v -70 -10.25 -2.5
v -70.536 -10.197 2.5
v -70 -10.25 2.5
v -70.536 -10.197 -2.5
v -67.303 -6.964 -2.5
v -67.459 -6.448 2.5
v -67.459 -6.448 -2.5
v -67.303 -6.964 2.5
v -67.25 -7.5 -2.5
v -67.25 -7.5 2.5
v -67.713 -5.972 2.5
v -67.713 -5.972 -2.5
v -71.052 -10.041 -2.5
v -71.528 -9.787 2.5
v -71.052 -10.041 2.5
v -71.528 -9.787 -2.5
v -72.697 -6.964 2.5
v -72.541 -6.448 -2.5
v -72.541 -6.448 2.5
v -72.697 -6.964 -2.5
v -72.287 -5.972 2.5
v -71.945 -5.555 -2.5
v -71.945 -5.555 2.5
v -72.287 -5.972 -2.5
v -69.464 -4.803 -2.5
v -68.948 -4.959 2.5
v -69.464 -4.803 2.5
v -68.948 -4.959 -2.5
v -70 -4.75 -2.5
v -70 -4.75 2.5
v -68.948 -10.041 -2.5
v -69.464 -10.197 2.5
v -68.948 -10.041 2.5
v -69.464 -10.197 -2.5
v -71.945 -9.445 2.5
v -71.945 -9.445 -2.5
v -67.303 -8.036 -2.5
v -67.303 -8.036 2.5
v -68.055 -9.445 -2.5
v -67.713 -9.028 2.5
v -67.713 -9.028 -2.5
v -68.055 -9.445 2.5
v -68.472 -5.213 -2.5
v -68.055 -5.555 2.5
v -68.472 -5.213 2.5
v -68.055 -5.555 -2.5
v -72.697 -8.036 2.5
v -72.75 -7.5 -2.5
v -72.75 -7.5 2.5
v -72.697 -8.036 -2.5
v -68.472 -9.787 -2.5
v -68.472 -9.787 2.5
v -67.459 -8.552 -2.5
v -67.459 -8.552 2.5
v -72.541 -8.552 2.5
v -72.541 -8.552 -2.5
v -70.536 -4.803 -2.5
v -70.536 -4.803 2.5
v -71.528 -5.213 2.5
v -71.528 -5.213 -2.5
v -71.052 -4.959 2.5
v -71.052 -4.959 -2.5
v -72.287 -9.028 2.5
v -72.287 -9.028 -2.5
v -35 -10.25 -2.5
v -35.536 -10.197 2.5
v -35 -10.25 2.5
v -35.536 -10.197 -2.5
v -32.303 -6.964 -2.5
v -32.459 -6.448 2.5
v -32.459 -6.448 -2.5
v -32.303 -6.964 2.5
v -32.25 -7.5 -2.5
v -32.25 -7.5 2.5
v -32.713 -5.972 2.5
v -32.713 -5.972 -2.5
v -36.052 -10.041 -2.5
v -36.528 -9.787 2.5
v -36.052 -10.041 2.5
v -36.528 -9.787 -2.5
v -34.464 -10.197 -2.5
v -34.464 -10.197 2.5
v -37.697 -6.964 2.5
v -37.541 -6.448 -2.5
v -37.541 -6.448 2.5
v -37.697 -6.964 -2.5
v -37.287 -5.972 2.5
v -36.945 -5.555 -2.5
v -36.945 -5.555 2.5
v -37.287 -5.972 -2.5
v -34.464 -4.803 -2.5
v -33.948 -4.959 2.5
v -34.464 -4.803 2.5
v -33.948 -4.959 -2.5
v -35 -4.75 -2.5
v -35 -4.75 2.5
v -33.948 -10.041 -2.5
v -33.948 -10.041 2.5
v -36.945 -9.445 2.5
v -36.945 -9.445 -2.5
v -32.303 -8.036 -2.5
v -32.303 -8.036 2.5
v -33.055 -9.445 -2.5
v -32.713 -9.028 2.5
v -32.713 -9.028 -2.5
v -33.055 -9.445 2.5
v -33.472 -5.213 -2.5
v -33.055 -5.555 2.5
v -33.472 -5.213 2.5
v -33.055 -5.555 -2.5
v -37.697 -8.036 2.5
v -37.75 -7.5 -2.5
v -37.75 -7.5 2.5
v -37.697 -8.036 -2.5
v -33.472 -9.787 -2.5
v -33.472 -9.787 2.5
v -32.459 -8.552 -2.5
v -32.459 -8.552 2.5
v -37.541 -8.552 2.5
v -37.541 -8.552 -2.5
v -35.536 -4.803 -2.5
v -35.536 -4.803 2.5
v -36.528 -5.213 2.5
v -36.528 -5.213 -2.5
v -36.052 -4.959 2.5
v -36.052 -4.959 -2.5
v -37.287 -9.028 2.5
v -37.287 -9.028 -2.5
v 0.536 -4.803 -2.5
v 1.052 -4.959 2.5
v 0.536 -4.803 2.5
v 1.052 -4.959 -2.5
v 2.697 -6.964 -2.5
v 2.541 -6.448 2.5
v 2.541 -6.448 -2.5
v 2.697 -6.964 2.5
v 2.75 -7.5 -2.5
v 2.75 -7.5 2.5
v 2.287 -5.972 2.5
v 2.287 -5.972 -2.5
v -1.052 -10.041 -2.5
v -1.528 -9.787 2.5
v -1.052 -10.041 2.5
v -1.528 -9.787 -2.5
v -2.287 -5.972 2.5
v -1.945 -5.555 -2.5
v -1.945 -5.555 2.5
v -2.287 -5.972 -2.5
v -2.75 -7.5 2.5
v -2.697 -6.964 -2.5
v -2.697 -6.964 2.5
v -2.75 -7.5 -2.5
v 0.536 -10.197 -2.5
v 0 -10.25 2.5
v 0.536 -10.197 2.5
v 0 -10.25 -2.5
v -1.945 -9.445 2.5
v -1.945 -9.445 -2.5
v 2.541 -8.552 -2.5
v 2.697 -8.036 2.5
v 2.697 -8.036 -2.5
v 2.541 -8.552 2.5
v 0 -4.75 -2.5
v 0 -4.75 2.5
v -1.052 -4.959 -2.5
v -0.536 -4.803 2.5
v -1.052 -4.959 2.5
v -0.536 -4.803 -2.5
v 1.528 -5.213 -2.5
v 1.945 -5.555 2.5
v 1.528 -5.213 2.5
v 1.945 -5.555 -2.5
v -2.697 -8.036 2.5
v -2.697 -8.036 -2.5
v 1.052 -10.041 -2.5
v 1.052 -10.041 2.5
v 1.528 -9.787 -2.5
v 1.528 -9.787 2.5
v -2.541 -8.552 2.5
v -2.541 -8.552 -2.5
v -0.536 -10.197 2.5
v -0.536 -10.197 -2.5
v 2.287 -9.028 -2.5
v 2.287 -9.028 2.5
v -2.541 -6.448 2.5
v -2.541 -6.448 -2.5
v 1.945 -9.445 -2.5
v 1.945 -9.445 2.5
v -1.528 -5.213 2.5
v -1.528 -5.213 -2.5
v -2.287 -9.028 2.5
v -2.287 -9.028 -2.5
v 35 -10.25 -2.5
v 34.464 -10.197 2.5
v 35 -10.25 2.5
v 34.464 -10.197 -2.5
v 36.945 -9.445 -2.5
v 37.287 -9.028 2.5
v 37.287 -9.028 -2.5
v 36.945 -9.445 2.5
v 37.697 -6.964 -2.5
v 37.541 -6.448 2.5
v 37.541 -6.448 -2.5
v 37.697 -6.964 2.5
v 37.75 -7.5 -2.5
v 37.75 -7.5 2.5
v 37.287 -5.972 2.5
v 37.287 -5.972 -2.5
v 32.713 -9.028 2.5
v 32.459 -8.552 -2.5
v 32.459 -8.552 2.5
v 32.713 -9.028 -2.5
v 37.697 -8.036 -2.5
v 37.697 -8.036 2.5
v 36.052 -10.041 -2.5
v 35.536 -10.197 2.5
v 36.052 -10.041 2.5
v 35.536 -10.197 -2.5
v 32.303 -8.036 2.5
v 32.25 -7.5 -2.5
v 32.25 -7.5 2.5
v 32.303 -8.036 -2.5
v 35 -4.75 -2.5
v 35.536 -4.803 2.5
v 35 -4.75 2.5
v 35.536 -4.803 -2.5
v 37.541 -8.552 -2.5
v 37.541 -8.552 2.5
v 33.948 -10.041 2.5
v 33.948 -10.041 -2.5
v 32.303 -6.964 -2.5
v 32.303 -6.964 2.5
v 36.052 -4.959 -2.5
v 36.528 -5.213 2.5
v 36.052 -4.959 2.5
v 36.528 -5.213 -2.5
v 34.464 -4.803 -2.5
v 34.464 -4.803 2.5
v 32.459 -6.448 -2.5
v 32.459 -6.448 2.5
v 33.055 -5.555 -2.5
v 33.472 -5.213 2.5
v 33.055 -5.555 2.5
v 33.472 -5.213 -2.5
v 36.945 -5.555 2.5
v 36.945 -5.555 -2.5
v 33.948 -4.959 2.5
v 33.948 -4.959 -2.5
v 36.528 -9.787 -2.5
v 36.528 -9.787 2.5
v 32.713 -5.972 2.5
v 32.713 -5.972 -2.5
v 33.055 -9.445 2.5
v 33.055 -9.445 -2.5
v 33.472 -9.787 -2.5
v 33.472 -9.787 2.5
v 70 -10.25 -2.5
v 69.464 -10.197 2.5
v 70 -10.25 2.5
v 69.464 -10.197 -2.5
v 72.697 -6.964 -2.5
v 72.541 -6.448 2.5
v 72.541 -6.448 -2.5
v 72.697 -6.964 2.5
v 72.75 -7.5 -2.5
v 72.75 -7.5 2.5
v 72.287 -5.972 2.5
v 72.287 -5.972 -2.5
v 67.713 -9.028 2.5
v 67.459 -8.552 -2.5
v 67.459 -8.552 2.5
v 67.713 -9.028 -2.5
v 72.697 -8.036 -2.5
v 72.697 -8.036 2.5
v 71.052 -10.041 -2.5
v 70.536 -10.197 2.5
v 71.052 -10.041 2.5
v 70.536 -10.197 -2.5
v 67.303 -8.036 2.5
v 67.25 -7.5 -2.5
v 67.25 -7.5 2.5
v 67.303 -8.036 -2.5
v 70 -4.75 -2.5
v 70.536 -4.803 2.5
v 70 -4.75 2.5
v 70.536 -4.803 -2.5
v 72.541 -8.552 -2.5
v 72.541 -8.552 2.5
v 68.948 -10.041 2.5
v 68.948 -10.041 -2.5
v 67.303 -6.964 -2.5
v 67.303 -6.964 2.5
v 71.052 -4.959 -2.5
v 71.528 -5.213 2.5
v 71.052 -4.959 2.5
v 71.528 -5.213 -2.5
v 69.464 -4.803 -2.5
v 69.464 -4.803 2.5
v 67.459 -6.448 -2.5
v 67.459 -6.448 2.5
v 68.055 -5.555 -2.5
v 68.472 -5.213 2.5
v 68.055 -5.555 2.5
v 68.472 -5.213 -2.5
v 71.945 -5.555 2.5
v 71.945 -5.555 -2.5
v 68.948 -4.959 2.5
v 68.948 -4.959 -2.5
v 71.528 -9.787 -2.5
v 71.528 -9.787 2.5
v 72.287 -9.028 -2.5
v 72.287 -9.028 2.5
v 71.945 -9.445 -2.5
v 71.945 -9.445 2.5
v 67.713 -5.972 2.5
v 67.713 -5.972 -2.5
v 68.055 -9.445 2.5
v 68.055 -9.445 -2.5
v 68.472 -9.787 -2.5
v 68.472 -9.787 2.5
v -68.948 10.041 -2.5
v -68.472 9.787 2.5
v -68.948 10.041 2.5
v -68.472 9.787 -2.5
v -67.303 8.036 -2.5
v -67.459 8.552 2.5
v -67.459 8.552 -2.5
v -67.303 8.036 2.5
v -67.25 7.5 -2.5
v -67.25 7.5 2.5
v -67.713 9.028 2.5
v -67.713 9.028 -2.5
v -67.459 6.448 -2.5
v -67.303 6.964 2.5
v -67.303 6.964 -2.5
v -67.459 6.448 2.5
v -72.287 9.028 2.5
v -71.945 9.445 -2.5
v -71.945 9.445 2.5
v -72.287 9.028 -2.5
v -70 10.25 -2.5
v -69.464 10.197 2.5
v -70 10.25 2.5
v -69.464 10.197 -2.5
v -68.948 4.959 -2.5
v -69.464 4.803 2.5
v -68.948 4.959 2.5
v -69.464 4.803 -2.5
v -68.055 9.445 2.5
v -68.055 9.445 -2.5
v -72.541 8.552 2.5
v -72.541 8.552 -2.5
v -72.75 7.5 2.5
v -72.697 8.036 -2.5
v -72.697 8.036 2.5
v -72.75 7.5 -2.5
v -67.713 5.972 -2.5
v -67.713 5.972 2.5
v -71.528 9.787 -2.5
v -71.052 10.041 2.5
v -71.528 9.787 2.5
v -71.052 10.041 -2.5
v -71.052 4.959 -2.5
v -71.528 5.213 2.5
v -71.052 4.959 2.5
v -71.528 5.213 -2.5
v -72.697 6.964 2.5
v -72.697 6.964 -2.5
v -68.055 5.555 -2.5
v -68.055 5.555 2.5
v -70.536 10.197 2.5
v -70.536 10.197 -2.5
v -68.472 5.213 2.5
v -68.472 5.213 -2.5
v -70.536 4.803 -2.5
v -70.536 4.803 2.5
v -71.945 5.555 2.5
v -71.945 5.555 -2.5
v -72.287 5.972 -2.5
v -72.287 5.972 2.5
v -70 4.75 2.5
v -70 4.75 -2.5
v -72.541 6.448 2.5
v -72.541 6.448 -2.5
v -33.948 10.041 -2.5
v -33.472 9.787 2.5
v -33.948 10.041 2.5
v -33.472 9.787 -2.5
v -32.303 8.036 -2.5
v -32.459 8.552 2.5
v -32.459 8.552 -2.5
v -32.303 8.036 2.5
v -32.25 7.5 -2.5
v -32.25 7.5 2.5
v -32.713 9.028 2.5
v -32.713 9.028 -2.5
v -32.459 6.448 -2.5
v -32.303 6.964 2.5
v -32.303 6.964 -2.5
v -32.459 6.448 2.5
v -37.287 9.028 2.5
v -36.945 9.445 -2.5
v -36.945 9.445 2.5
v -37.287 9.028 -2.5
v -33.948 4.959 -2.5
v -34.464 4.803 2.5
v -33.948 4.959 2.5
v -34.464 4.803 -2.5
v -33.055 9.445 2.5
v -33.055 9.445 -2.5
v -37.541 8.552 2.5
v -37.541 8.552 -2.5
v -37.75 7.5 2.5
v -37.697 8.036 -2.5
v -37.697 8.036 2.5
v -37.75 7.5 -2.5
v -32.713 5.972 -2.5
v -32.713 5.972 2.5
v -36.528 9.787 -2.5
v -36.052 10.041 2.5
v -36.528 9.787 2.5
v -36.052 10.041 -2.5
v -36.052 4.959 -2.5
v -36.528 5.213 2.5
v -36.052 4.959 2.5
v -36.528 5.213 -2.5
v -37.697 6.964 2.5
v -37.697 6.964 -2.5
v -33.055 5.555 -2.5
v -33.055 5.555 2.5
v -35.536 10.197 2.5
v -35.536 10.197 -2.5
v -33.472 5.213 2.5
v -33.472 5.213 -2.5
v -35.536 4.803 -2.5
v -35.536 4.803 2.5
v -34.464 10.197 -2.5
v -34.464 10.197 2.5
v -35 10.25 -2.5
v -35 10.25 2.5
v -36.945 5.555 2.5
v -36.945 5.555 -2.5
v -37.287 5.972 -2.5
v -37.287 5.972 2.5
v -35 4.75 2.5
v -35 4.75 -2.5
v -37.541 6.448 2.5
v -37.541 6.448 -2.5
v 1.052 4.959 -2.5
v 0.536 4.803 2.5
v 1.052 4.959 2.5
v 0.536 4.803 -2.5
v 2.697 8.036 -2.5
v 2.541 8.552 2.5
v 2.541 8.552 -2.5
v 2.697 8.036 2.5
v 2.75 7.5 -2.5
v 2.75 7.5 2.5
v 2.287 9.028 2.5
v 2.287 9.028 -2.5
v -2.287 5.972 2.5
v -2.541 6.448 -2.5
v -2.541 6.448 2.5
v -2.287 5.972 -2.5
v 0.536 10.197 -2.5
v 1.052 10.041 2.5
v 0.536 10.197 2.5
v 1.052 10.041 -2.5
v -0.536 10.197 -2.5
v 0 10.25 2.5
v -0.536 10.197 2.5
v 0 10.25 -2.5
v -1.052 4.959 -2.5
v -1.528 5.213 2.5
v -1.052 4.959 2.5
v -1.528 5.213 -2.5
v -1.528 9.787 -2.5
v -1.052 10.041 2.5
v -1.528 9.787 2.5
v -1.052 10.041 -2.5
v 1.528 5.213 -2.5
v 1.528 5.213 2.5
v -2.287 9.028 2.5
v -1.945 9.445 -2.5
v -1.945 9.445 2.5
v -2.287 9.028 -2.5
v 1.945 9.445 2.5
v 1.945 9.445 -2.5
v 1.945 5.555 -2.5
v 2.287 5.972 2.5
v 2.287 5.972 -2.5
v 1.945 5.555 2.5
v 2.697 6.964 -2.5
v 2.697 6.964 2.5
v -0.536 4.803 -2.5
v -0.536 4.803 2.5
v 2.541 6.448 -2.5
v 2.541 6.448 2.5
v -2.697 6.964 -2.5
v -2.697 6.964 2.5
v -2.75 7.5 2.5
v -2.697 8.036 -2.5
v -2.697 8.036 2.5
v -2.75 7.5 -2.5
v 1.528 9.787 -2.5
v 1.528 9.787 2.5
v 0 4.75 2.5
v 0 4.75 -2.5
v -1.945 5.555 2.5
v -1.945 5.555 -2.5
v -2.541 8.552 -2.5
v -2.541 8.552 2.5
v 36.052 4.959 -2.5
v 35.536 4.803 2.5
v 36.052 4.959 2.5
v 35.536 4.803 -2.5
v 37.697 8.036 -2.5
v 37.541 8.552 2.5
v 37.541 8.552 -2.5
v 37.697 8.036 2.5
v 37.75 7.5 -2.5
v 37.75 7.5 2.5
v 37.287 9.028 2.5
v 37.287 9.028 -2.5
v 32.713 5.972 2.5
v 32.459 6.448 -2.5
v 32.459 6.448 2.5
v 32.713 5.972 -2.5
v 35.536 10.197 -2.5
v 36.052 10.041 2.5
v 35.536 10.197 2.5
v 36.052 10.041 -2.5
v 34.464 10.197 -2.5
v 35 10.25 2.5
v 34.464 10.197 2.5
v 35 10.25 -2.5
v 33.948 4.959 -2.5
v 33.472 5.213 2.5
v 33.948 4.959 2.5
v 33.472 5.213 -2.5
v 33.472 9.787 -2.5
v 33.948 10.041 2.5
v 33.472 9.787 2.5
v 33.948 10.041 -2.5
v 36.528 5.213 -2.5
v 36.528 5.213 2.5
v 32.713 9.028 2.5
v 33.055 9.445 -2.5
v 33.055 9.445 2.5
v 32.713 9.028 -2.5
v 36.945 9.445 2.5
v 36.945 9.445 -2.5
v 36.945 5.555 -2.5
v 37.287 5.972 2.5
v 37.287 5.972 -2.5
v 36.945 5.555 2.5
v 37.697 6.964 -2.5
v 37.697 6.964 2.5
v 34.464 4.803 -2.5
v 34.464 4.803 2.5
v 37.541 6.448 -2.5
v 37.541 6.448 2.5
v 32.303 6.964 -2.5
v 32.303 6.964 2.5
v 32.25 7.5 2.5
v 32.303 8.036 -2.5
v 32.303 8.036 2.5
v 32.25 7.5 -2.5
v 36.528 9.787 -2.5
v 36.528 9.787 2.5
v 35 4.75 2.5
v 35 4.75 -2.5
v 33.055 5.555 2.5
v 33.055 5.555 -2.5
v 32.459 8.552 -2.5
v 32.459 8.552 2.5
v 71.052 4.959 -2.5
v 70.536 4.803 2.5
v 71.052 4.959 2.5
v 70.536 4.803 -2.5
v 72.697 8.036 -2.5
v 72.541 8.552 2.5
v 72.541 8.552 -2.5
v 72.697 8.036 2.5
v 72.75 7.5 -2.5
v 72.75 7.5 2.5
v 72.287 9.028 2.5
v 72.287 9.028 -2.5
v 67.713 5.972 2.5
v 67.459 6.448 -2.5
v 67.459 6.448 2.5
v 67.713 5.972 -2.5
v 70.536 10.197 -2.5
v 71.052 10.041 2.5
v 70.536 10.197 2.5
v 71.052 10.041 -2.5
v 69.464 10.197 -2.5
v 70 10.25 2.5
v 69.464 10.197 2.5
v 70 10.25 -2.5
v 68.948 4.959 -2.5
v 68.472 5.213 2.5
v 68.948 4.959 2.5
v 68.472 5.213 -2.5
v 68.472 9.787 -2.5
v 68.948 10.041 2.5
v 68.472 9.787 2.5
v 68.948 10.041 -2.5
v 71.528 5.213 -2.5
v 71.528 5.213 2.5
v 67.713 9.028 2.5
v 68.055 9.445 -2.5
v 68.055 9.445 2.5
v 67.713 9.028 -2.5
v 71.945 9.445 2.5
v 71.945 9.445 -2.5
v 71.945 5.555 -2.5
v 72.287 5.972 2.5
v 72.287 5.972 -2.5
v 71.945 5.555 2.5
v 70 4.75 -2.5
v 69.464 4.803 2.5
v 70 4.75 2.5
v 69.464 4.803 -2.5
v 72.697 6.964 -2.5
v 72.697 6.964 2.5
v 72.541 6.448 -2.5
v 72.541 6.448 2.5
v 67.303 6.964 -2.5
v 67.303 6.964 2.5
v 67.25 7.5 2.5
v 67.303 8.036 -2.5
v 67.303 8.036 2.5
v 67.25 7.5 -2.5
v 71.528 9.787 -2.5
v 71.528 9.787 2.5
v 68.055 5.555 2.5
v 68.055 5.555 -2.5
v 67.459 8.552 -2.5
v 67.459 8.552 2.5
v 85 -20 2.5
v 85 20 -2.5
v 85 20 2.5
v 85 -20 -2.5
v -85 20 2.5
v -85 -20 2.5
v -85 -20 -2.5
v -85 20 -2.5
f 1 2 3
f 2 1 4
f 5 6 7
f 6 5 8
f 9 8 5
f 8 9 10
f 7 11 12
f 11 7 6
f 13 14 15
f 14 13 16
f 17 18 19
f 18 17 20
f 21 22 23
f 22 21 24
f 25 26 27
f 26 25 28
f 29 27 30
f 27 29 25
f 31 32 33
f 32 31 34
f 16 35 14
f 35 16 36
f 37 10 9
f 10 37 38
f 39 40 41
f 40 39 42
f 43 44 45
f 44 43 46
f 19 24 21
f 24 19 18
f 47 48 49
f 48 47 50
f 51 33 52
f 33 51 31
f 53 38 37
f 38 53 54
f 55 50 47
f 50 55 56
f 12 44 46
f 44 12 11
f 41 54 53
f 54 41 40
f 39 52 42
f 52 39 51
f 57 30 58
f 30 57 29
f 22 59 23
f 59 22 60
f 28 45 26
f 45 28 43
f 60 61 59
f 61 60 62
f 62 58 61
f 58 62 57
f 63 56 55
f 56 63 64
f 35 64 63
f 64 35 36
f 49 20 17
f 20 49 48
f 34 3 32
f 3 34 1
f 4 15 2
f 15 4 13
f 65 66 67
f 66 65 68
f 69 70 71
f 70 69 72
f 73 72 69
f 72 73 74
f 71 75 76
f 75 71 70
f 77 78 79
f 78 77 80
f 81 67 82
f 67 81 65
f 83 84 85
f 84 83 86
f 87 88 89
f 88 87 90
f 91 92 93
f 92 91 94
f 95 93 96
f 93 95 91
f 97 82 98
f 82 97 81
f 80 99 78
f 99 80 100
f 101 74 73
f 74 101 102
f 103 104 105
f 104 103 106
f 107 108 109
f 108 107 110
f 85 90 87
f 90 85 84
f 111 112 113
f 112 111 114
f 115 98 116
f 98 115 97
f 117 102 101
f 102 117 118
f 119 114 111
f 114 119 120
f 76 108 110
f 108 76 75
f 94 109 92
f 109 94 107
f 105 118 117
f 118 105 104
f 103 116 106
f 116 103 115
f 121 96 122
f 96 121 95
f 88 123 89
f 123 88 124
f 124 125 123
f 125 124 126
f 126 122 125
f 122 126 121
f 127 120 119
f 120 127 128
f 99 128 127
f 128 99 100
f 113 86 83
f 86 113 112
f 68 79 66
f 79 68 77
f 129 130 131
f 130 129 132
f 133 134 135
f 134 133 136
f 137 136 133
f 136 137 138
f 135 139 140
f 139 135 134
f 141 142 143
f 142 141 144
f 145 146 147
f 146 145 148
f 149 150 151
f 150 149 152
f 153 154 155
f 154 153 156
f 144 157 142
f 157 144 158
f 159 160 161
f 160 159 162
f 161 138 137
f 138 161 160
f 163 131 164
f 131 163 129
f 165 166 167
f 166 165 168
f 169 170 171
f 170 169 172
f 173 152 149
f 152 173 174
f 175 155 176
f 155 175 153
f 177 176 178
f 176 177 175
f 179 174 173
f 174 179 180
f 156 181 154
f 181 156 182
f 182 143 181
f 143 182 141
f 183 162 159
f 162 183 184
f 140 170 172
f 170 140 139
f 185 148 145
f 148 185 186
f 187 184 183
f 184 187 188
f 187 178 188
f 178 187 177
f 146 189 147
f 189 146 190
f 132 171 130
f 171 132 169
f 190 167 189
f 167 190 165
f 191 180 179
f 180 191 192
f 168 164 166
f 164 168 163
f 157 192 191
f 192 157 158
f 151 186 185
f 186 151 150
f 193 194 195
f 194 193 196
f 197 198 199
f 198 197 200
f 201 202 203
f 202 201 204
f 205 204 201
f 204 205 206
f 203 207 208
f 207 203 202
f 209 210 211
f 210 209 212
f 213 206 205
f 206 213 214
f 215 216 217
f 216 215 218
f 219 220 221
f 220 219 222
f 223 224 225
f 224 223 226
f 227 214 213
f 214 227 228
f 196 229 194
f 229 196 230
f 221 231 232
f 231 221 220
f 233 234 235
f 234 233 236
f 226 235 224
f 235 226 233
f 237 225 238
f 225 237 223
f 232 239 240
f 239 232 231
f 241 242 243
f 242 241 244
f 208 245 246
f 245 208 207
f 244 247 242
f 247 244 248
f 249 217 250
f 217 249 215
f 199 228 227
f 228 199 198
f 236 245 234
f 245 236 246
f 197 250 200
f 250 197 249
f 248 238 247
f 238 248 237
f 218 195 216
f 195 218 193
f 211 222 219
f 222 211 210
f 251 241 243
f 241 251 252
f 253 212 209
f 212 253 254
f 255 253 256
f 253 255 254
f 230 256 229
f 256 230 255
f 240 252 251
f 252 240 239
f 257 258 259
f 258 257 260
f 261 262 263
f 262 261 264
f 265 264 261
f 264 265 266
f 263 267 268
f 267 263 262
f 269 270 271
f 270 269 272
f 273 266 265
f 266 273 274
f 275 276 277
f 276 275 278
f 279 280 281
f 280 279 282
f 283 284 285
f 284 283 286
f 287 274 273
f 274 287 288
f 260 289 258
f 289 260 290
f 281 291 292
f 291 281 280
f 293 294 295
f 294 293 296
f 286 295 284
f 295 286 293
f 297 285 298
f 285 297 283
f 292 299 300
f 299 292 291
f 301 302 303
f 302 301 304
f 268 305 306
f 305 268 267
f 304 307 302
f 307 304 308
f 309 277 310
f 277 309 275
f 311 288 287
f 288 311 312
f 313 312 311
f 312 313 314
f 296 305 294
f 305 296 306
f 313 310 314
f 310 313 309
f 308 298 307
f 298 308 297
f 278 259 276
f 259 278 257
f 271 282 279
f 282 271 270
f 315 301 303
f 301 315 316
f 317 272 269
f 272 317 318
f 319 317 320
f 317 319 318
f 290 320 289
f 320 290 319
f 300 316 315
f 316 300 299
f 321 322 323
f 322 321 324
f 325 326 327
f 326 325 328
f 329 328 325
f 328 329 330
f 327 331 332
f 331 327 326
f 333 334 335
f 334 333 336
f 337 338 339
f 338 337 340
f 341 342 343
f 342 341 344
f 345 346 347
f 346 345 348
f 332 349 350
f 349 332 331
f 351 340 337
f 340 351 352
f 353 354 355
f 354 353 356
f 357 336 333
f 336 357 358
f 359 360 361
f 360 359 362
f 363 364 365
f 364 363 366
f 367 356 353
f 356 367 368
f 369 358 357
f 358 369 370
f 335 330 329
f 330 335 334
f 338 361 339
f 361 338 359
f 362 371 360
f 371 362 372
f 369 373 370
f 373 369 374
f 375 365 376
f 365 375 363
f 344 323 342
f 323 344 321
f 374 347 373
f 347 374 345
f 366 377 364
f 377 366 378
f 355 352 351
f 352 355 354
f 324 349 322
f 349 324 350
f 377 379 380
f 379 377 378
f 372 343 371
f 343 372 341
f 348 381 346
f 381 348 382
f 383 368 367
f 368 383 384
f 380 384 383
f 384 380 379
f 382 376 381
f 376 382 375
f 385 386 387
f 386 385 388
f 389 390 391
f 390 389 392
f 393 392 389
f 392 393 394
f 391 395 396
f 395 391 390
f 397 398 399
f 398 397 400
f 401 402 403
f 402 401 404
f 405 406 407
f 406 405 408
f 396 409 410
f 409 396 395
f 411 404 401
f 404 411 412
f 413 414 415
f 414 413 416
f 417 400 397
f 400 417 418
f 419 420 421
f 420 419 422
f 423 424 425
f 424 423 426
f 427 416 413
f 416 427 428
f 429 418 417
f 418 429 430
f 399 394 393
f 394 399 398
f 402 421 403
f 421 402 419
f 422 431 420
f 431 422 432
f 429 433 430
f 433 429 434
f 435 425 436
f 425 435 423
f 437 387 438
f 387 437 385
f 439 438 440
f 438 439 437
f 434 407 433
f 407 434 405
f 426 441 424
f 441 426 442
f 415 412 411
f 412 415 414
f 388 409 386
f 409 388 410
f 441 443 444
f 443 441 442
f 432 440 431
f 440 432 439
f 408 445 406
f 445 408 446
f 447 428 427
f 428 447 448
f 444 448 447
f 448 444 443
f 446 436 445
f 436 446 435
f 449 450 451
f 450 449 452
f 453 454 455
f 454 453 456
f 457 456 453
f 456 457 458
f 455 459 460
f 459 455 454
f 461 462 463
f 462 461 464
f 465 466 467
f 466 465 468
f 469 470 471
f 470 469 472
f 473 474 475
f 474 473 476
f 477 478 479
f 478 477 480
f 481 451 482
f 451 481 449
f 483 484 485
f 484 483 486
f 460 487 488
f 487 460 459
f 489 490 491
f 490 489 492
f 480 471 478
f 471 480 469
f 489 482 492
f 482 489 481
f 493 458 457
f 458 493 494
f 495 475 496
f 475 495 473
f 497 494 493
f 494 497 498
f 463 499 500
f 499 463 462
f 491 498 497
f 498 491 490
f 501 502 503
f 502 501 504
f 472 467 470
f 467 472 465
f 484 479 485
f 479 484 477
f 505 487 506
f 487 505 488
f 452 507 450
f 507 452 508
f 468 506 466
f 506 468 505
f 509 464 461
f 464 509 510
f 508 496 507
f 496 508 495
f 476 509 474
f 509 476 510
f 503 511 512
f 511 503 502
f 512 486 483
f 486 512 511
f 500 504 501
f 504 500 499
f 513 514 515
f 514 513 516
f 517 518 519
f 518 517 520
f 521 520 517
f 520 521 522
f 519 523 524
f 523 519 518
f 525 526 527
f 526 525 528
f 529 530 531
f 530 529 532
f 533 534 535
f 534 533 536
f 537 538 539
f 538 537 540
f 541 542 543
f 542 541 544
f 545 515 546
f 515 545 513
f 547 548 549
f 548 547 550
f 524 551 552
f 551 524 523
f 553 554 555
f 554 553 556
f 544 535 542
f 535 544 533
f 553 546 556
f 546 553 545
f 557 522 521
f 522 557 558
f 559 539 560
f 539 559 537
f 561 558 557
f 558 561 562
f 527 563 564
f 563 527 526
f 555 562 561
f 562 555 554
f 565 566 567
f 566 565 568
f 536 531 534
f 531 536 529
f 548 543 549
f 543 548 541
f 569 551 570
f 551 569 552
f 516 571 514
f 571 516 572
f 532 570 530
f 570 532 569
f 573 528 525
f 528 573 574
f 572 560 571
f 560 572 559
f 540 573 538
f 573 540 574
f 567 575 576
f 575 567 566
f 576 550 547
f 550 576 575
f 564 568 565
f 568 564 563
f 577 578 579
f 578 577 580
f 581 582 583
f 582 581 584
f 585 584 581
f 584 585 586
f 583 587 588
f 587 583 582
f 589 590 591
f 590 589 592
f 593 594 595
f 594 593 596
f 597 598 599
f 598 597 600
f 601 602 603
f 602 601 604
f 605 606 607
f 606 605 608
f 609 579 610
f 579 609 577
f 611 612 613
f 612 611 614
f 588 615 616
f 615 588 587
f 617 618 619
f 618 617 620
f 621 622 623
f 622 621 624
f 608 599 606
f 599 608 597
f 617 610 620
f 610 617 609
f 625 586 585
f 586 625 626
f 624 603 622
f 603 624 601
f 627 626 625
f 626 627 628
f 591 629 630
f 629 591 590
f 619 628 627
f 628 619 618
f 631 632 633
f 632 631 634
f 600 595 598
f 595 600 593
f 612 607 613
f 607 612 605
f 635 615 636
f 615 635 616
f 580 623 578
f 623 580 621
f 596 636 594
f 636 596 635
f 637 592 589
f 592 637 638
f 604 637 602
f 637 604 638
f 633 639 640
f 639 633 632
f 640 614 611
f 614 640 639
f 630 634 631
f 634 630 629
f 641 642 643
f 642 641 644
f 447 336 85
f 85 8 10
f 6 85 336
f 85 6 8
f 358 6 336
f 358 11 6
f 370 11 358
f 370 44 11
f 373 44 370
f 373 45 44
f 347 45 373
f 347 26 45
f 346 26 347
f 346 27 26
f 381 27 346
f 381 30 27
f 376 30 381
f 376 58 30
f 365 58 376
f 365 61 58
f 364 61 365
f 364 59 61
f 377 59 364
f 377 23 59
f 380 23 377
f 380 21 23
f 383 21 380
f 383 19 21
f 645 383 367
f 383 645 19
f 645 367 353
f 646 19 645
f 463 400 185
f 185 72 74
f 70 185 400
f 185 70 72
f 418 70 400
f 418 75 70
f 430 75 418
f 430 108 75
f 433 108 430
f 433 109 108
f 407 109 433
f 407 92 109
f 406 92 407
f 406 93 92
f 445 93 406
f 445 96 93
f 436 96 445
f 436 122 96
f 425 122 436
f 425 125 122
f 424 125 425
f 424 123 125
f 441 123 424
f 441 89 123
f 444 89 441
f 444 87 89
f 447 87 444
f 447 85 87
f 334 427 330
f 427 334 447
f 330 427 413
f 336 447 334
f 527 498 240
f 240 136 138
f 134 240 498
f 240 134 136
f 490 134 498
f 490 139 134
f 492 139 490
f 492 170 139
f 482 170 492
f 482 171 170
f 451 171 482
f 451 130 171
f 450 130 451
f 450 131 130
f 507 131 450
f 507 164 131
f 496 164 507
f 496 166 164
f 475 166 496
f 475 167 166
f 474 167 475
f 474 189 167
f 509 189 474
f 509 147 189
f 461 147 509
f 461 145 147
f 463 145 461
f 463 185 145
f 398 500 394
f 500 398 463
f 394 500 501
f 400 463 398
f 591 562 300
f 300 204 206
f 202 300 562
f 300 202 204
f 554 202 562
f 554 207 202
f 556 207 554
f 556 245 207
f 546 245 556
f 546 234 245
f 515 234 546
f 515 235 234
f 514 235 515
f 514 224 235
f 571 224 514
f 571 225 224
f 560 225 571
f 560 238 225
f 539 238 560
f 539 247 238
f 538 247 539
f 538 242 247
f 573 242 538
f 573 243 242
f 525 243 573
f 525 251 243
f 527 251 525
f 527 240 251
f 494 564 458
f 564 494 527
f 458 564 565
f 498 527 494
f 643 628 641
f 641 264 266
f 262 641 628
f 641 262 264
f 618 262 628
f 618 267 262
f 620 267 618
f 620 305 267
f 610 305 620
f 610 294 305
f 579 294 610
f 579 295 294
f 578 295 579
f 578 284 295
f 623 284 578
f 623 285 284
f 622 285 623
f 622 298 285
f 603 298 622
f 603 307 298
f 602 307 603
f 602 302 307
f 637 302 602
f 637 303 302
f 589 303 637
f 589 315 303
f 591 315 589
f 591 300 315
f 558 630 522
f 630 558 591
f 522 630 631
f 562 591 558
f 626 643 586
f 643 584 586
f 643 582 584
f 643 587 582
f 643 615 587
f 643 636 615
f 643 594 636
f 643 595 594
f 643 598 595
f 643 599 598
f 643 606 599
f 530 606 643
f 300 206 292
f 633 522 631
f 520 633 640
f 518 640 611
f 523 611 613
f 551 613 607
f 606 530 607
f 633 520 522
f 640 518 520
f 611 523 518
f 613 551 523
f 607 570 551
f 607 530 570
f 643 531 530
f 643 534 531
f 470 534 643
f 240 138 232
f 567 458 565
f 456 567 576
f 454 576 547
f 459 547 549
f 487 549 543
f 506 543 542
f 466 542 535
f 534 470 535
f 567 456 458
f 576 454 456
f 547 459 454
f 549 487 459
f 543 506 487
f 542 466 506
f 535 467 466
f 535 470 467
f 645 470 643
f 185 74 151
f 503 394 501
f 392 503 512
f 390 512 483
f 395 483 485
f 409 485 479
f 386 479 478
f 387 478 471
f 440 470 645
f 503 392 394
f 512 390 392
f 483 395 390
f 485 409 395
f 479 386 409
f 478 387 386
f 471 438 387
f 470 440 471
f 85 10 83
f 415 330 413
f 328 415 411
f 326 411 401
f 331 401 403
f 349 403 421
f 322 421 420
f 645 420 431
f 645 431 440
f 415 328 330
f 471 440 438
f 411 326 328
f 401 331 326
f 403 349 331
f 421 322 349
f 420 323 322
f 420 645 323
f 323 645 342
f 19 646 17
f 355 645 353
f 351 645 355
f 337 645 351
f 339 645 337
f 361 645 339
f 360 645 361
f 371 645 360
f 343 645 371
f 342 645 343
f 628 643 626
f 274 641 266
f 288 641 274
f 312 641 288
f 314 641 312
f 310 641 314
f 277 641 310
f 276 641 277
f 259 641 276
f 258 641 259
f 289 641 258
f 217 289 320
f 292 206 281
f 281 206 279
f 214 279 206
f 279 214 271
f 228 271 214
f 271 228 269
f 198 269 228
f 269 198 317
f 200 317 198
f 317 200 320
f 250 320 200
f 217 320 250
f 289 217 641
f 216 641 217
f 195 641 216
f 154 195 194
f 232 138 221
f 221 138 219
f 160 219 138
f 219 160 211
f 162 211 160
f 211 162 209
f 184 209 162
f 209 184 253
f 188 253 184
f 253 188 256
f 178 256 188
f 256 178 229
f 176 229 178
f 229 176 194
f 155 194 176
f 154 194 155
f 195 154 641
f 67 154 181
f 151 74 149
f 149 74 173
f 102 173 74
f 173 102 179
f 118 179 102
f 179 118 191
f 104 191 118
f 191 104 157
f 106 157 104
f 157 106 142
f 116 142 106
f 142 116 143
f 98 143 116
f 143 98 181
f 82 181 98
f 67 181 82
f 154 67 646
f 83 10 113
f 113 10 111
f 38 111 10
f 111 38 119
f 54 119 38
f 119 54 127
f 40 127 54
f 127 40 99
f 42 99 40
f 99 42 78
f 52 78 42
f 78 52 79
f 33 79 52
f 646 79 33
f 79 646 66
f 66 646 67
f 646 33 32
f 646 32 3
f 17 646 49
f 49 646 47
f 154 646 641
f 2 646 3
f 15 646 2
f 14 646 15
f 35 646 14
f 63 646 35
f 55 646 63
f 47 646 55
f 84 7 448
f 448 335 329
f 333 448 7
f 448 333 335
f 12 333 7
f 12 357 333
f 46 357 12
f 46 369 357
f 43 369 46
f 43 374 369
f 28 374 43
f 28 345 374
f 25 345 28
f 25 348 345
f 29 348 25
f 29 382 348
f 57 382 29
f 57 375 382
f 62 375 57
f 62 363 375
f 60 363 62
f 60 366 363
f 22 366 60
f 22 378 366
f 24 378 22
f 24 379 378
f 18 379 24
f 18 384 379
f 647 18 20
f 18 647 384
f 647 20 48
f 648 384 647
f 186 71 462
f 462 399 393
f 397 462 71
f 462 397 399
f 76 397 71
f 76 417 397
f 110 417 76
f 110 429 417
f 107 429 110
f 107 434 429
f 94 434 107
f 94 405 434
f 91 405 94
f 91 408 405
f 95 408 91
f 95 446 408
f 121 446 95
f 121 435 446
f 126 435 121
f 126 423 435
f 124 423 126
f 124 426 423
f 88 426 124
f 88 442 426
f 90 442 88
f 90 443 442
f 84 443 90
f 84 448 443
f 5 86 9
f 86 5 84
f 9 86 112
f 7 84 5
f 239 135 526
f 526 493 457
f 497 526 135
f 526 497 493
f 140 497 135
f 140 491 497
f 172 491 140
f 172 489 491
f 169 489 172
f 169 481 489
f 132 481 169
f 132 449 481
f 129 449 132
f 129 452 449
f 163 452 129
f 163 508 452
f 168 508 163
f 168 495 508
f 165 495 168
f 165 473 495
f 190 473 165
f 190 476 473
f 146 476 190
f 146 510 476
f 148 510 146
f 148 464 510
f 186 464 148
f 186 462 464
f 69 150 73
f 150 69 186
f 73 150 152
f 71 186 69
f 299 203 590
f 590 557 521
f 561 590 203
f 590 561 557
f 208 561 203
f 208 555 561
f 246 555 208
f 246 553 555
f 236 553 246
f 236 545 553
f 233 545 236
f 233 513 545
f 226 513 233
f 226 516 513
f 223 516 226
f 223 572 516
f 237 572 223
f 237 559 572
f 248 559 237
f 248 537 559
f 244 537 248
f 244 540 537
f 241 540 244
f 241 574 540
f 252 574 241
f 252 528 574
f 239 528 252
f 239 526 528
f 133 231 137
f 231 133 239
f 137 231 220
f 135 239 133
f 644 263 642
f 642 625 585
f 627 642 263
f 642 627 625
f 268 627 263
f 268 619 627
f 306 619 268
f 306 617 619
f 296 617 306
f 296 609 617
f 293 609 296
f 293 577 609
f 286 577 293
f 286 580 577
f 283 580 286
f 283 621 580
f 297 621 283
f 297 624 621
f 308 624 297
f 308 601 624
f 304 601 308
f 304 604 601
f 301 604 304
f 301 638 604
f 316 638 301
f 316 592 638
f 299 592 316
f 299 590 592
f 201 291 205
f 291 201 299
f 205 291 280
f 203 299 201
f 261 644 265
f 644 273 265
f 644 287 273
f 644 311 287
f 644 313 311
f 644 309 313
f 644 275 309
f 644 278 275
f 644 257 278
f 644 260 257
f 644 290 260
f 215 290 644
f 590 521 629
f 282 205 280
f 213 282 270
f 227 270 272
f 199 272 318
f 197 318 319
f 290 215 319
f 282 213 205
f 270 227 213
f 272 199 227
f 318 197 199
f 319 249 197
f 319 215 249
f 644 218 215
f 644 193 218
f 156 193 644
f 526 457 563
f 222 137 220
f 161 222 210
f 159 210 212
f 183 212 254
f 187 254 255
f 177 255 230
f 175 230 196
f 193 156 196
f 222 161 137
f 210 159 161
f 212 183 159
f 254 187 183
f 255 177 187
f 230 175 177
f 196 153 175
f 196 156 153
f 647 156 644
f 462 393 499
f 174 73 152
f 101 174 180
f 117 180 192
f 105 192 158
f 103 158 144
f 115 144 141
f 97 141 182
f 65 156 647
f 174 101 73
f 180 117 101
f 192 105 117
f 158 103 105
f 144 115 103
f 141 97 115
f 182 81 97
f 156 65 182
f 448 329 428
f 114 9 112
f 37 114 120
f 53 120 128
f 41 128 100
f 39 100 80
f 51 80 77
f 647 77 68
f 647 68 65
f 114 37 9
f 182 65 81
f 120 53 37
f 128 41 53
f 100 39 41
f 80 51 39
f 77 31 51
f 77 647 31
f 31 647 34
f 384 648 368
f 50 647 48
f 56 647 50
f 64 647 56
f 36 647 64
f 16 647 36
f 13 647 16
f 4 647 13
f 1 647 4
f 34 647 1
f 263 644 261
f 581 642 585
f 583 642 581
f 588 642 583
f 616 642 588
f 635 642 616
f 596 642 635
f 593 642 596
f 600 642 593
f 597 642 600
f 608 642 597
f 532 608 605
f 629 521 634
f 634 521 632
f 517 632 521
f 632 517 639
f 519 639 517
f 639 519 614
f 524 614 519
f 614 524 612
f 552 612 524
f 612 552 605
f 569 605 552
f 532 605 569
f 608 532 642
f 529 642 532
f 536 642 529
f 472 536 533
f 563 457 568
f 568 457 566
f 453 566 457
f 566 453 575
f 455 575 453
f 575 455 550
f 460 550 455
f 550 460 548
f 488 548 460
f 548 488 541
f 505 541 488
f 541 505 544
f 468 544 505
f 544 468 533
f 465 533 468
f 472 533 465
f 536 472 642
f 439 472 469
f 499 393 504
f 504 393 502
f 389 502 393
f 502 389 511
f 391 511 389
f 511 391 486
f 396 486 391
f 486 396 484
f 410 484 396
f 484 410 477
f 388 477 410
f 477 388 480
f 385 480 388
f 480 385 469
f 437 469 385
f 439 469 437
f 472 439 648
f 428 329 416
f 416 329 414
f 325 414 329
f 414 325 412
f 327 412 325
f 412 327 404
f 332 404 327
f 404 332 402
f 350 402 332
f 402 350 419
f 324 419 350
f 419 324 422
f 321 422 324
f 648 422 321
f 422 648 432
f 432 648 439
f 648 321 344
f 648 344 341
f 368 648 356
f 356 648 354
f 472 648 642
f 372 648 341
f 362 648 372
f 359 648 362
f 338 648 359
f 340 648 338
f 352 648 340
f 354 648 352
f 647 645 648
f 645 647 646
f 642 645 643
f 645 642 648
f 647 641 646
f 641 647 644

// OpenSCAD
$fn = 32;

// ----------------------------------------------------------------------
// Hole bar, 5 x Ø5.5
// tworows layout, 15 mm edge offset
// ----------------------------------------------------------------------

// --- parameters (mm) ---
bar_w = 40;       // bar width (Y)
bar_t = 5;        // bar thickness (Z)
holes = 5;        // holes per row
hole_d = 5.5;     // hole diameter
edge = 15;        // offset from the bar end to the first hole
pitch = 35;       // pitch between neighbouring holes
row_offset = 15;  // distance between the two rows

// --- derived feature positions (mm) ---
span = (holes - 1) * pitch;   // = 140   distance between the end holes
bar_l = span + 2 * edge;      // = 170   overall bar length
start_x = -bar_l / 2 + edge;  // = -70   X of the first hole
feature_centers = [
  [start_x + 0 * pitch, -row_offset / 2],
  [start_x + 1 * pitch, -row_offset / 2],
  [start_x + 2 * pitch, -row_offset / 2],
  [start_x + 3 * pitch, -row_offset / 2],
  [start_x + 4 * pitch, -row_offset / 2]
];   // hole centres of the first row
row2_centers = [
  [start_x + 0 * pitch, row_offset / 2],
  [start_x + 1 * pitch, row_offset / 2],
  [start_x + 2 * pitch, row_offset / 2],
  [start_x + 3 * pitch, row_offset / 2],
  [start_x + 4 * pitch, row_offset / 2]
];   // hole centres of the second row

// bar with two rows of holes, both read from their own centre arrays
difference() {
  translate([-bar_l / 2, -bar_w / 2, -bar_t / 2]) cube([bar_l, bar_w, bar_t]);
  for (centre = feature_centers)
    translate([centre[0], centre[1], 0])
      cylinder(d = hole_d, h = bar_t + 2, center = true);
  for (centre = row2_centers)
    translate([centre[0], centre[1], 0])
      cylinder(d = hole_d, h = bar_t + 2, center = true);
}
